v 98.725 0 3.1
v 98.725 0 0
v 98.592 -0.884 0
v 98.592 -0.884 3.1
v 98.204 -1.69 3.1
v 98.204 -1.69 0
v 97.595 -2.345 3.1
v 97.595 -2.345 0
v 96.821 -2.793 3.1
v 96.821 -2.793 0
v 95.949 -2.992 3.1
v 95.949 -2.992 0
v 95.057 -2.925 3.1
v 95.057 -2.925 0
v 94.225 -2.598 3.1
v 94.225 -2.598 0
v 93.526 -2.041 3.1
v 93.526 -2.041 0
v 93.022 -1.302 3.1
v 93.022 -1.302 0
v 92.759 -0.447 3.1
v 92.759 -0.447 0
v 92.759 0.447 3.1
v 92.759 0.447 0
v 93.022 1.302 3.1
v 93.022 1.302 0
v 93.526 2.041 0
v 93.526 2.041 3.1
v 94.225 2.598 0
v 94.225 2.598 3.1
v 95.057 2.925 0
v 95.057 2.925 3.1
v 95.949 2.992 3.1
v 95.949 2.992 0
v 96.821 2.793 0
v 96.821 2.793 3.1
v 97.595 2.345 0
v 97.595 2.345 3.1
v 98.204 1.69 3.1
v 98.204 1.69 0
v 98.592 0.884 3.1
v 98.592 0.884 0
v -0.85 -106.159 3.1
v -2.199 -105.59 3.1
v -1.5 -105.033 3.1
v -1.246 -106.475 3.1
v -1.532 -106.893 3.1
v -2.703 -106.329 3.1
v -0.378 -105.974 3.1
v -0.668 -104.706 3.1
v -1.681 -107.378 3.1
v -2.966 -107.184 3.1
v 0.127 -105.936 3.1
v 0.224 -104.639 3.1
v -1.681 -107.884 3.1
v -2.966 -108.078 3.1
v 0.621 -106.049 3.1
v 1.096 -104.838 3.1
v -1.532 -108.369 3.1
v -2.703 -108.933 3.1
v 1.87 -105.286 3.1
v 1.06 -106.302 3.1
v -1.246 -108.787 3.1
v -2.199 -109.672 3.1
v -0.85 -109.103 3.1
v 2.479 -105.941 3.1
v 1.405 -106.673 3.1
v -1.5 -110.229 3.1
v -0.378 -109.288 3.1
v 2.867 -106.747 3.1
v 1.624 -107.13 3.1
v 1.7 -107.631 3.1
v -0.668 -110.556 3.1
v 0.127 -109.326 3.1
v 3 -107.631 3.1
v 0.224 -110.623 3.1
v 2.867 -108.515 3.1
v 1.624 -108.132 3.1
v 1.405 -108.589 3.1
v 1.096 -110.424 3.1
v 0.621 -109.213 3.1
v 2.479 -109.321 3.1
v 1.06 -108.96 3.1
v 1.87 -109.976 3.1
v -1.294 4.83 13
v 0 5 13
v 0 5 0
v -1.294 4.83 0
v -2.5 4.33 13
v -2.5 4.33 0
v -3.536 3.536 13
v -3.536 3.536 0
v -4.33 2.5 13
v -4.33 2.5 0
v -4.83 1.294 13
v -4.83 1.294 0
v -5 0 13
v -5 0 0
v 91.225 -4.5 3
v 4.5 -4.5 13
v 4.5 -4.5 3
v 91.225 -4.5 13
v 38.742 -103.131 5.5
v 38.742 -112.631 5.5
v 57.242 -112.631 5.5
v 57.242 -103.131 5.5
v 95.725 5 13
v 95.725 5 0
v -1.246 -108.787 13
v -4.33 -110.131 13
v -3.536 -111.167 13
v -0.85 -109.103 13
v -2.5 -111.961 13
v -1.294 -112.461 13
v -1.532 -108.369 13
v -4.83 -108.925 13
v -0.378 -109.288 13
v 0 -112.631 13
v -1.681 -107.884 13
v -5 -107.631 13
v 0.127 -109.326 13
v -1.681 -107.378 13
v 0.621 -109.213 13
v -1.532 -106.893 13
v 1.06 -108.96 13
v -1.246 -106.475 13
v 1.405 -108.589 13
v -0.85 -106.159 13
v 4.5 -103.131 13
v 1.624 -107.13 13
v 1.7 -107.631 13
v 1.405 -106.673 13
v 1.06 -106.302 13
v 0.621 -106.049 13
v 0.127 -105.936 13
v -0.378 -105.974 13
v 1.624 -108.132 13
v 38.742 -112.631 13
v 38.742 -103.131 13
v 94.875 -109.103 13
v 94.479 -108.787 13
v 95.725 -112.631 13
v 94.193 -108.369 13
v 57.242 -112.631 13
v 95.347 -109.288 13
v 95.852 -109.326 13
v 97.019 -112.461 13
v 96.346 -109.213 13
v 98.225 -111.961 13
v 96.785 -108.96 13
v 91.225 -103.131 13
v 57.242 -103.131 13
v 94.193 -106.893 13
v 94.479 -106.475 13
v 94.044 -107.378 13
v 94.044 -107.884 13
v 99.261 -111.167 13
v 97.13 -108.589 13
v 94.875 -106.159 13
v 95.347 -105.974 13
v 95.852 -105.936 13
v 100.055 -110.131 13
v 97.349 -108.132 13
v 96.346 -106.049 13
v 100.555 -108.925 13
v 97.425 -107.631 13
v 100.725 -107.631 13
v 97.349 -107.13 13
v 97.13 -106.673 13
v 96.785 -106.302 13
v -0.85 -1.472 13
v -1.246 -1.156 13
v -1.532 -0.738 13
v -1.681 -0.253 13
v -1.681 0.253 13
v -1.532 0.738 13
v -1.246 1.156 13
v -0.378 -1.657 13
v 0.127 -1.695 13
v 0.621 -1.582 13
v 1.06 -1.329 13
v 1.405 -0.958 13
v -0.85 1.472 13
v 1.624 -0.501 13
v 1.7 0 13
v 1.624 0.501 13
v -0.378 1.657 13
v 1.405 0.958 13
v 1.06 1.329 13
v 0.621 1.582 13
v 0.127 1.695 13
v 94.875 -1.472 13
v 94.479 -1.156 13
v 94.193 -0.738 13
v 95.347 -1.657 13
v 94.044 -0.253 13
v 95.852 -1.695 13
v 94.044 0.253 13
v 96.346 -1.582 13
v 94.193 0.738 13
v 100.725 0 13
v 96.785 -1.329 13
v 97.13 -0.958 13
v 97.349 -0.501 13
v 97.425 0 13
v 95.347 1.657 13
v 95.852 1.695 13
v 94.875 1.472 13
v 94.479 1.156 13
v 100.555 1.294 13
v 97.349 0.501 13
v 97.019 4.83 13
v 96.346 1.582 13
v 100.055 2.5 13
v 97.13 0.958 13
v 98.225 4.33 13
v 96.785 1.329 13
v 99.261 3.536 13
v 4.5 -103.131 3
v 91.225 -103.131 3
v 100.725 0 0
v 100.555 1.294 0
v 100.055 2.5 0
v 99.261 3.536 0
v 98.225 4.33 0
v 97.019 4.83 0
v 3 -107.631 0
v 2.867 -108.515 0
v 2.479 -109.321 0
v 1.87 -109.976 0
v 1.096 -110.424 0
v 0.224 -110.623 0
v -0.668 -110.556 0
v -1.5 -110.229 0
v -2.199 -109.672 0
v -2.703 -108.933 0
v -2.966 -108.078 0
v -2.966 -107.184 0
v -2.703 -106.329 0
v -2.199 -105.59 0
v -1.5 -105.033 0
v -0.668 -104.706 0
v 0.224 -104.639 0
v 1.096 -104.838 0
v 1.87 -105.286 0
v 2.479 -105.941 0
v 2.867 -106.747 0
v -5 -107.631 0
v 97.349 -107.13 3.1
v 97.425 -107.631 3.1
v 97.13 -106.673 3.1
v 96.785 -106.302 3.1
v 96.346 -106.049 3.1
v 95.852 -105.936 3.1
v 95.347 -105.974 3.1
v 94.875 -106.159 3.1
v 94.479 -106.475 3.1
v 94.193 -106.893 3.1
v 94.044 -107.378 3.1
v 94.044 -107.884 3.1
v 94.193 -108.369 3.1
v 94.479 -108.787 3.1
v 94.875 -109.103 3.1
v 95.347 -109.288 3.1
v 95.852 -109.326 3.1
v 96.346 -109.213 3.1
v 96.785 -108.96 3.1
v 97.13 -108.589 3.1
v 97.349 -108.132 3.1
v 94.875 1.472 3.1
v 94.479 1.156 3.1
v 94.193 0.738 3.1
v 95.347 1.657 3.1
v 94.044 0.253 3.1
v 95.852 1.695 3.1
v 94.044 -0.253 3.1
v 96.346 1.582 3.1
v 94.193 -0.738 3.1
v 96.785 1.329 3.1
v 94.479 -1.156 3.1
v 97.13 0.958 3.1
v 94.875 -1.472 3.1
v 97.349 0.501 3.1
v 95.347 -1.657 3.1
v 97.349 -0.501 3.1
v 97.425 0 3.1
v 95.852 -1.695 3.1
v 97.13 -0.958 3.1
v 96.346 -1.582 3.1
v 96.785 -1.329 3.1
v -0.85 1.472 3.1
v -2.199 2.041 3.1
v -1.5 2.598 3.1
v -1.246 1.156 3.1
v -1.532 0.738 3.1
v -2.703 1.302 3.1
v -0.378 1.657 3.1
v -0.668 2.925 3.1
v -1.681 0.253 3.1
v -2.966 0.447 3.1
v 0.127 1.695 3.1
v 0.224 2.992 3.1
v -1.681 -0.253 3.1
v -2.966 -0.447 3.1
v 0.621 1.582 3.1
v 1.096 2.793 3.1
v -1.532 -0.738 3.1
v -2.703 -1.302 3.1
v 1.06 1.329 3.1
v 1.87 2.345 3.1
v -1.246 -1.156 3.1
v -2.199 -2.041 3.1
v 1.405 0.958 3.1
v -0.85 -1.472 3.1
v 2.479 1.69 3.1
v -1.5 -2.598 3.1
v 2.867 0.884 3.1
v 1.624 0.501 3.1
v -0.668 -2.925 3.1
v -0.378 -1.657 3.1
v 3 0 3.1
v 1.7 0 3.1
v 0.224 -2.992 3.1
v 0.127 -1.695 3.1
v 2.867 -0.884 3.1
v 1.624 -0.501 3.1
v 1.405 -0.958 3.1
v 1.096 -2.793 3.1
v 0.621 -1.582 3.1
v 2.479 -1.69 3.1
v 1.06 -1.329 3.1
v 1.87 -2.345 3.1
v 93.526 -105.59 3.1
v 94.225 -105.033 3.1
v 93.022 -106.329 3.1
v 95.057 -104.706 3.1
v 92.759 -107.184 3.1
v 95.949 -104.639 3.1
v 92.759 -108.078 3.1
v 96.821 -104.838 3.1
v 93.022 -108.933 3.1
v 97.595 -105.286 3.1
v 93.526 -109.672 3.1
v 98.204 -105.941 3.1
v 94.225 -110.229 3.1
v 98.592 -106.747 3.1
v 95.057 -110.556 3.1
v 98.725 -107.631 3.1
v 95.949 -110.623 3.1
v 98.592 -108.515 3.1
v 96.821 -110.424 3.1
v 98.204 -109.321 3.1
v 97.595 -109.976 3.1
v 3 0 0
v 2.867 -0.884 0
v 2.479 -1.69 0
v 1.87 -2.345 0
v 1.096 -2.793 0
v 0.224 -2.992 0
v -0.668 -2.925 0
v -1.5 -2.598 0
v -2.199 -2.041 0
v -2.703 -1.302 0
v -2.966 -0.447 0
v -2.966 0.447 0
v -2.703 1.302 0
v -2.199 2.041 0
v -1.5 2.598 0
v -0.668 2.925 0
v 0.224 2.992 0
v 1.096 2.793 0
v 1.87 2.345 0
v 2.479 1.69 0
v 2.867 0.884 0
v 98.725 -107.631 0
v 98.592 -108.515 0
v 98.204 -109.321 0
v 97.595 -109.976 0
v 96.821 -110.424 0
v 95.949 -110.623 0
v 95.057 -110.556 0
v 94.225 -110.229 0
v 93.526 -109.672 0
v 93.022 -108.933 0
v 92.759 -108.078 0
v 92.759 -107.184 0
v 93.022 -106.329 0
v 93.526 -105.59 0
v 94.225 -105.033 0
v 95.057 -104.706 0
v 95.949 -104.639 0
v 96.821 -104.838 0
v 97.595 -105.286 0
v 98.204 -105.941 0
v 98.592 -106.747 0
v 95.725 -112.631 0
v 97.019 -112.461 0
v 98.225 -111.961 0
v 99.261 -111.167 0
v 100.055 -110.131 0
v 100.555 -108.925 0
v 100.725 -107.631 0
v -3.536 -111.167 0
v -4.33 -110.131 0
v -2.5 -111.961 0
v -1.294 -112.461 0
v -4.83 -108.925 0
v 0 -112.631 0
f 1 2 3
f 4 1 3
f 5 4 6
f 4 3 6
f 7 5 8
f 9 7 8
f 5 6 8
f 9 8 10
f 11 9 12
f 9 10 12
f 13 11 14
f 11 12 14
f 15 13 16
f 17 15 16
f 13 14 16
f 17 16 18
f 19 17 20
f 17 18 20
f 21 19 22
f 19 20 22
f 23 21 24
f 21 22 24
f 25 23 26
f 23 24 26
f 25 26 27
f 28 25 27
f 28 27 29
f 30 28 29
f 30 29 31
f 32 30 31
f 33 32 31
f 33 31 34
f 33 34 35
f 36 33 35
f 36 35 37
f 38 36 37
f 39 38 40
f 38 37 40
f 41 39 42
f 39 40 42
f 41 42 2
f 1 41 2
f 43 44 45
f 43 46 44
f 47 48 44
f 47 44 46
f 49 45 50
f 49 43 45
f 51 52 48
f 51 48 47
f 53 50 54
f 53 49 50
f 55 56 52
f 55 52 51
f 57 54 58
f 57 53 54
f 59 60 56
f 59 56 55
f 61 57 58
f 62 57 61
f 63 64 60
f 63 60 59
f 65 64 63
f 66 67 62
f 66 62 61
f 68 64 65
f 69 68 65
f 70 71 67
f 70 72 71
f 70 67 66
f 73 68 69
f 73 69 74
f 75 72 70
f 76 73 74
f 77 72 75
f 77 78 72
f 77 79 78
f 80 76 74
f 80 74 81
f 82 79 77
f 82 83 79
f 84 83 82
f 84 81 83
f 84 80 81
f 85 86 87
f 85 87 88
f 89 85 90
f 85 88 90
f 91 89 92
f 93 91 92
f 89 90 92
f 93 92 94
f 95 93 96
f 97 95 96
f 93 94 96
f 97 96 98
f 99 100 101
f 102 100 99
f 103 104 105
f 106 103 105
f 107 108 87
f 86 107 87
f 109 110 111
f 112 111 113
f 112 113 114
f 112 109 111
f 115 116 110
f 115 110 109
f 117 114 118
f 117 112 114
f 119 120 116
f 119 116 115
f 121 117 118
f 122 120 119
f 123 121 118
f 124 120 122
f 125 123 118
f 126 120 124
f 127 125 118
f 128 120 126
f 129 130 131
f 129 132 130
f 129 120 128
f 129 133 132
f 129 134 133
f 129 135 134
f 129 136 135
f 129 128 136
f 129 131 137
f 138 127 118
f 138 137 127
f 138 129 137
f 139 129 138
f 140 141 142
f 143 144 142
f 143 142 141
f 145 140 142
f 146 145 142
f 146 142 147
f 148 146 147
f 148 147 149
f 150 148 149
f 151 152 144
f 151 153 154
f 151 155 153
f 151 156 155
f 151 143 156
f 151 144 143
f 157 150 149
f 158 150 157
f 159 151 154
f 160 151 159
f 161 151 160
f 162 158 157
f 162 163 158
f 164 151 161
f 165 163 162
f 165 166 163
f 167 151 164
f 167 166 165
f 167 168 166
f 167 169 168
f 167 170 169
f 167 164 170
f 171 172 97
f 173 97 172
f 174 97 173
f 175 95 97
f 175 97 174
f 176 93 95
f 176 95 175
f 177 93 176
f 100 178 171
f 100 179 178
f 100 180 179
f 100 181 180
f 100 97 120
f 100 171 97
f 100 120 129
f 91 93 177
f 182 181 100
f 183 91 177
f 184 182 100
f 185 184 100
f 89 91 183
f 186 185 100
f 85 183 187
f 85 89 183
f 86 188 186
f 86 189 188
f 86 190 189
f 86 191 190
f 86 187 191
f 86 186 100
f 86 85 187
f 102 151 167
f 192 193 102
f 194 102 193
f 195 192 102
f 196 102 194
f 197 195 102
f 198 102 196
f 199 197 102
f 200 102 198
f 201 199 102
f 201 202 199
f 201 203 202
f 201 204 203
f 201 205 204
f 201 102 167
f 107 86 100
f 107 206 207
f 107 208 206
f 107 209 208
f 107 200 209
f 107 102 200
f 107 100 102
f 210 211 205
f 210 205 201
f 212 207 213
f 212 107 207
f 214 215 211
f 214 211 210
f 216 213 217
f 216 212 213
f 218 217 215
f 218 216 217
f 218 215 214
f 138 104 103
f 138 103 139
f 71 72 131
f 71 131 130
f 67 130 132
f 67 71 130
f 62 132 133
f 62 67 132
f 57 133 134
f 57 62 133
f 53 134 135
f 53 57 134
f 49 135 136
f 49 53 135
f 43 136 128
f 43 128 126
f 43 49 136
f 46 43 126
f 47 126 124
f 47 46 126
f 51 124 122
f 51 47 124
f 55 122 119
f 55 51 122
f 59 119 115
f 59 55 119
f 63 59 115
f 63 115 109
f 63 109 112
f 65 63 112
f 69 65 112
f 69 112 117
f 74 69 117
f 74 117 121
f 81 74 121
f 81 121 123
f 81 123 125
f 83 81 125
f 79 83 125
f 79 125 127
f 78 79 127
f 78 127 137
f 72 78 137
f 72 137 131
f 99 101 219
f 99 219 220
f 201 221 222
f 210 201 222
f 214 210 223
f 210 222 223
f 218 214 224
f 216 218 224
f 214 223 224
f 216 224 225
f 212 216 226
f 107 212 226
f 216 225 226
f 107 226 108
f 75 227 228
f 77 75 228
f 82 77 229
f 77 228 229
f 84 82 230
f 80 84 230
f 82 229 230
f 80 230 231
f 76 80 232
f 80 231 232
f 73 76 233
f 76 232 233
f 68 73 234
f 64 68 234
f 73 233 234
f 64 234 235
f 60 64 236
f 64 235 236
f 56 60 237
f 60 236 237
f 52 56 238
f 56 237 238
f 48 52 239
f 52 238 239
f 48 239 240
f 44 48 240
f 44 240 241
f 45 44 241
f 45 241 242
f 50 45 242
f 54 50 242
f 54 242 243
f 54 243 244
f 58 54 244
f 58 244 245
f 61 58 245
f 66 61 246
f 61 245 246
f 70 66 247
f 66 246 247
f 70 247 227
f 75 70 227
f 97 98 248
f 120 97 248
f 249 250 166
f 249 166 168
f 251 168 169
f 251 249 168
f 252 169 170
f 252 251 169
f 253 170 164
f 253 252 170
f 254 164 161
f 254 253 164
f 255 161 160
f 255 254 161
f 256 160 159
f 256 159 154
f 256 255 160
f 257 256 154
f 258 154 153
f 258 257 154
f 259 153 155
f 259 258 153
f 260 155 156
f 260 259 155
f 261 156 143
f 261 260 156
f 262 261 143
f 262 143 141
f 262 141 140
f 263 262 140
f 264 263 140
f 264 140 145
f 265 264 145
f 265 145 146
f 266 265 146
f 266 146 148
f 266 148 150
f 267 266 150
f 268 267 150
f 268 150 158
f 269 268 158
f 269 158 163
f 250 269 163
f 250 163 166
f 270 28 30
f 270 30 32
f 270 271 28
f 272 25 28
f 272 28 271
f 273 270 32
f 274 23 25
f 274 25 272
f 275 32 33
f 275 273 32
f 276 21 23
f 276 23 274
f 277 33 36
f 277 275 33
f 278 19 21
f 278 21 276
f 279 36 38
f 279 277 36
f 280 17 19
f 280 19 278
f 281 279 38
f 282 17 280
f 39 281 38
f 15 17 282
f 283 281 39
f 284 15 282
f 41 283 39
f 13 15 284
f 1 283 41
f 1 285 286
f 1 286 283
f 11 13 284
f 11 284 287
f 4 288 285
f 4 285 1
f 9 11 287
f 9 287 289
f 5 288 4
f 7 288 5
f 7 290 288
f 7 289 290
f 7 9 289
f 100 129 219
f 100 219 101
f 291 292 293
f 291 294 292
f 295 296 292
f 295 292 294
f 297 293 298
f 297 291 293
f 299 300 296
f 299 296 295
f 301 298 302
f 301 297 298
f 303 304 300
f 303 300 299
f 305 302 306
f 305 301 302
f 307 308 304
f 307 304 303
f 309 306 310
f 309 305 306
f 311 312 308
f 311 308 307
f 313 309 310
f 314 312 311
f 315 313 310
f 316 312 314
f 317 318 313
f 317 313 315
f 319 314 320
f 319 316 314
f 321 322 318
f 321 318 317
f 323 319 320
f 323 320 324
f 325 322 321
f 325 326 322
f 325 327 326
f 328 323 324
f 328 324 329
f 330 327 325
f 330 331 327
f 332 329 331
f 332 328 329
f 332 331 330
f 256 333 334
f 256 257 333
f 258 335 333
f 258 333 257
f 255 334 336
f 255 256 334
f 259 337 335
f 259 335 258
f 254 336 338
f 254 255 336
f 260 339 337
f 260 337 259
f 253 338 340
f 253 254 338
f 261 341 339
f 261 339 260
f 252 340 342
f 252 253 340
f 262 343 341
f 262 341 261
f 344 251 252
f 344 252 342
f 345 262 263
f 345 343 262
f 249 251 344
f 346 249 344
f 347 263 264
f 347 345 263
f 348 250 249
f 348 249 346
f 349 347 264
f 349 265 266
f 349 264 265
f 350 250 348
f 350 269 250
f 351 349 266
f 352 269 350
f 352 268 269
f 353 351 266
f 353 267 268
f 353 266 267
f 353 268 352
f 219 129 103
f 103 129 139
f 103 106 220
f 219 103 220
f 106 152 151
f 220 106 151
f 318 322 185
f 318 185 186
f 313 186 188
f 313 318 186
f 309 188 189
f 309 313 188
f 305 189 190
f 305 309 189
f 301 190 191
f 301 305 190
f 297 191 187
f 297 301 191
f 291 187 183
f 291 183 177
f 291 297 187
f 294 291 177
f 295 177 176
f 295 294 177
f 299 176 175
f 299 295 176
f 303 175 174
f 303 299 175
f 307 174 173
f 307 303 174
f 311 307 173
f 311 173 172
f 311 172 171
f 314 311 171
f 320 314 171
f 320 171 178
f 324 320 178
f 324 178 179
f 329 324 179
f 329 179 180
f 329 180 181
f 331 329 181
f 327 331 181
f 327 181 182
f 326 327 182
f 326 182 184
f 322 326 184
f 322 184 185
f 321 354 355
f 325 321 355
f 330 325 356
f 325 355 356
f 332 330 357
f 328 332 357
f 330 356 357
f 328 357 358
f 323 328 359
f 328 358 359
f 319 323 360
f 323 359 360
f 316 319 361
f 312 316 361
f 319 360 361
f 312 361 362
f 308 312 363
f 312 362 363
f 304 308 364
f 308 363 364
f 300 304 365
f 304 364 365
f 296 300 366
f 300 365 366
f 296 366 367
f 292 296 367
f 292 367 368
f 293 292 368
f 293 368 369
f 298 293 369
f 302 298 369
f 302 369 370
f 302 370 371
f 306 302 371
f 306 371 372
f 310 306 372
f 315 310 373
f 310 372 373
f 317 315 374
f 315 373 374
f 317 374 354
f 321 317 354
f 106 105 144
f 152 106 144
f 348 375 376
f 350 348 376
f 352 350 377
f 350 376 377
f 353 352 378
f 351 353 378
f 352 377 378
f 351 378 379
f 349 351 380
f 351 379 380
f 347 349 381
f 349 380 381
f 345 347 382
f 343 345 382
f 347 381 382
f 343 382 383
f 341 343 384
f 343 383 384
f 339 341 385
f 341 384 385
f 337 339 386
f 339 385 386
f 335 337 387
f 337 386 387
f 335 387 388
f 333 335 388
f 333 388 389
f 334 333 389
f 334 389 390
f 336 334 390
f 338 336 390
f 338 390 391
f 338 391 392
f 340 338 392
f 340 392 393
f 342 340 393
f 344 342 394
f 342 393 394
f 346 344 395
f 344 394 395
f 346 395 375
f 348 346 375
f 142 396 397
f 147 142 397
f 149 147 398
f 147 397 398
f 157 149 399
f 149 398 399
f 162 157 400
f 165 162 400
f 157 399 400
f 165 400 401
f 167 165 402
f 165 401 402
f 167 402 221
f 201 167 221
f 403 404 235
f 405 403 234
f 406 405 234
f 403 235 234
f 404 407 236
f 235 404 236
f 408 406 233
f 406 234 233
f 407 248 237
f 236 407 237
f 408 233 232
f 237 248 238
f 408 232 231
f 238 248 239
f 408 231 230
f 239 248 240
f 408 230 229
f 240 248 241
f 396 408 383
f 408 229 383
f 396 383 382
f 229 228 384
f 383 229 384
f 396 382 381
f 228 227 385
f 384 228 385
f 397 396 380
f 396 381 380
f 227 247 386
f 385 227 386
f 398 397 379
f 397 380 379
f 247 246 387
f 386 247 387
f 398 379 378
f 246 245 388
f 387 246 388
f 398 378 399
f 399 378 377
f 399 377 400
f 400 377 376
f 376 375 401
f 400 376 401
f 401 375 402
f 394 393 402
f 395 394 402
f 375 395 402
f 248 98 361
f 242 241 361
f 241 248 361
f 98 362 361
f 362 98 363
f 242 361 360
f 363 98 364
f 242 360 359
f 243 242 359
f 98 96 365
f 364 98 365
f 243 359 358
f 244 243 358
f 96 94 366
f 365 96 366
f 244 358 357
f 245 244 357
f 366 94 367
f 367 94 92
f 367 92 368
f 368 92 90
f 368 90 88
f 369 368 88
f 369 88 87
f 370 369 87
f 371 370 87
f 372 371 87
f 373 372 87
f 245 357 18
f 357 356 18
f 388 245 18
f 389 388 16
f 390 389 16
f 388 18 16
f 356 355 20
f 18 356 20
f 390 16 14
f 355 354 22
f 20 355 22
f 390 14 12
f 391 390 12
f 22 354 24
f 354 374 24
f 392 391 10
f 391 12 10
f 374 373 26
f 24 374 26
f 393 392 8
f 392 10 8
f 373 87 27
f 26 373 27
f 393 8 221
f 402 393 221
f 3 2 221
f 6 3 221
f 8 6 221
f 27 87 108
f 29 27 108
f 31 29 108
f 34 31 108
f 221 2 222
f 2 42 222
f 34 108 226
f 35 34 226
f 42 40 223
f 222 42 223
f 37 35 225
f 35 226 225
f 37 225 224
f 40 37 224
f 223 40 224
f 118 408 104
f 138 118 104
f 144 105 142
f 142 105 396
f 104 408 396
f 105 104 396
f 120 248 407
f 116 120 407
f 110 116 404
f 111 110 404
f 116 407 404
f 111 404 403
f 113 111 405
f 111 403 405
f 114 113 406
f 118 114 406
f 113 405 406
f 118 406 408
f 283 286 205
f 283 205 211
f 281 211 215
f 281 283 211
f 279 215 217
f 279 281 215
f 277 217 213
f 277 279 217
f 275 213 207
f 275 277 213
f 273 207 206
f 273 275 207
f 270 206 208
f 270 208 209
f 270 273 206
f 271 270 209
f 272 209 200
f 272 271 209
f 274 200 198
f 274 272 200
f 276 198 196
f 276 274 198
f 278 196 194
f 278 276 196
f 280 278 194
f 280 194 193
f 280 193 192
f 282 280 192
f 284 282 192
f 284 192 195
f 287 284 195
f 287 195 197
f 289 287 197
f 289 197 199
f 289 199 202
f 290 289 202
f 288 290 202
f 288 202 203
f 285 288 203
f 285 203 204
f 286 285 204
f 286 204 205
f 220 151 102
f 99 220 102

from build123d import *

# Parameters (mm, degrees)
SKETCH_R        = 1.7
PAD_DEPTH       = 13
SKETCH001_W     = 86.725
SKETCH001_H     = 98.631
POCKET_DEPTH    = 10
SKETCH002_W     = 18.5
SKETCH002_H     = 7.5
POCKET001_DEPTH = 11
SKETCH003_R     = 3
POCKET002_DEPTH = 3.1


with BuildPart() as part:
    # Sketch → Pad (new body)
    with BuildSketch(Plane.XY):
        with BuildLine():
            Line((-5, 0), (-5, -107.631))
            ThreePointArc((-5, -107.631), (-3.535534, -111.166534), (0, -112.631))
            Line((0, -112.631), (95.725, -112.631))
            ThreePointArc((95.725, -112.631), (99.260534, -111.166534), (100.725, -107.631))
            Line((100.725, -107.631), (100.725, 0))
            ThreePointArc((100.725, 0), (99.260534, 3.535534), (95.725, 5))
            Line((95.725, 5), (0, 5))
            ThreePointArc((0, 5), (-3.535534, 3.535534), (-5, 0))
        make_face()
        Circle(SKETCH_R, mode=Mode.SUBTRACT)
        with Locations((95.725, 0)):
            Circle(SKETCH_R, mode=Mode.SUBTRACT)
        with Locations((95.725, -107.631)):
            Circle(SKETCH_R, mode=Mode.SUBTRACT)
        with Locations((0, -107.631)):
            Circle(SKETCH_R, mode=Mode.SUBTRACT)
    extrude(amount=PAD_DEPTH)

    # Sketch001 (on Face14 of Pad) → Pocket (cut)
    with BuildSketch(Plane.XY.offset(13)):
        with Locations((47.8625, -53.8155)):
            Rectangle(SKETCH001_W, SKETCH001_H)
    extrude(amount=-POCKET_DEPTH, mode=Mode.SUBTRACT)

    # Sketch002 (on Face7 of Pocket) → Pocket001 (cut)
    with BuildSketch(Plane.XZ.offset(112.631)):
        with Locations((47.992, 9.25)):
            Rectangle(SKETCH002_W, SKETCH002_H)
    extrude(amount=-POCKET001_DEPTH, mode=Mode.SUBTRACT)

    # Sketch003 (on Face4 of Pocket001) → Pocket002 (cut)
    with BuildSketch(Plane(origin=(0, 0, 0), x_dir=(1, 0, 0), z_dir=(0, 0, -1))):
        with Locations((0, 107.631)):
            Circle(SKETCH003_R)
        with Locations((95.725, 107.631)):
            Circle(SKETCH003_R)
        with Locations((95.725, 0)):
            Circle(SKETCH003_R)
        Circle(SKETCH003_R)
    extrude(amount=-POCKET002_DEPTH, mode=Mode.SUBTRACT)


solid = part.part
